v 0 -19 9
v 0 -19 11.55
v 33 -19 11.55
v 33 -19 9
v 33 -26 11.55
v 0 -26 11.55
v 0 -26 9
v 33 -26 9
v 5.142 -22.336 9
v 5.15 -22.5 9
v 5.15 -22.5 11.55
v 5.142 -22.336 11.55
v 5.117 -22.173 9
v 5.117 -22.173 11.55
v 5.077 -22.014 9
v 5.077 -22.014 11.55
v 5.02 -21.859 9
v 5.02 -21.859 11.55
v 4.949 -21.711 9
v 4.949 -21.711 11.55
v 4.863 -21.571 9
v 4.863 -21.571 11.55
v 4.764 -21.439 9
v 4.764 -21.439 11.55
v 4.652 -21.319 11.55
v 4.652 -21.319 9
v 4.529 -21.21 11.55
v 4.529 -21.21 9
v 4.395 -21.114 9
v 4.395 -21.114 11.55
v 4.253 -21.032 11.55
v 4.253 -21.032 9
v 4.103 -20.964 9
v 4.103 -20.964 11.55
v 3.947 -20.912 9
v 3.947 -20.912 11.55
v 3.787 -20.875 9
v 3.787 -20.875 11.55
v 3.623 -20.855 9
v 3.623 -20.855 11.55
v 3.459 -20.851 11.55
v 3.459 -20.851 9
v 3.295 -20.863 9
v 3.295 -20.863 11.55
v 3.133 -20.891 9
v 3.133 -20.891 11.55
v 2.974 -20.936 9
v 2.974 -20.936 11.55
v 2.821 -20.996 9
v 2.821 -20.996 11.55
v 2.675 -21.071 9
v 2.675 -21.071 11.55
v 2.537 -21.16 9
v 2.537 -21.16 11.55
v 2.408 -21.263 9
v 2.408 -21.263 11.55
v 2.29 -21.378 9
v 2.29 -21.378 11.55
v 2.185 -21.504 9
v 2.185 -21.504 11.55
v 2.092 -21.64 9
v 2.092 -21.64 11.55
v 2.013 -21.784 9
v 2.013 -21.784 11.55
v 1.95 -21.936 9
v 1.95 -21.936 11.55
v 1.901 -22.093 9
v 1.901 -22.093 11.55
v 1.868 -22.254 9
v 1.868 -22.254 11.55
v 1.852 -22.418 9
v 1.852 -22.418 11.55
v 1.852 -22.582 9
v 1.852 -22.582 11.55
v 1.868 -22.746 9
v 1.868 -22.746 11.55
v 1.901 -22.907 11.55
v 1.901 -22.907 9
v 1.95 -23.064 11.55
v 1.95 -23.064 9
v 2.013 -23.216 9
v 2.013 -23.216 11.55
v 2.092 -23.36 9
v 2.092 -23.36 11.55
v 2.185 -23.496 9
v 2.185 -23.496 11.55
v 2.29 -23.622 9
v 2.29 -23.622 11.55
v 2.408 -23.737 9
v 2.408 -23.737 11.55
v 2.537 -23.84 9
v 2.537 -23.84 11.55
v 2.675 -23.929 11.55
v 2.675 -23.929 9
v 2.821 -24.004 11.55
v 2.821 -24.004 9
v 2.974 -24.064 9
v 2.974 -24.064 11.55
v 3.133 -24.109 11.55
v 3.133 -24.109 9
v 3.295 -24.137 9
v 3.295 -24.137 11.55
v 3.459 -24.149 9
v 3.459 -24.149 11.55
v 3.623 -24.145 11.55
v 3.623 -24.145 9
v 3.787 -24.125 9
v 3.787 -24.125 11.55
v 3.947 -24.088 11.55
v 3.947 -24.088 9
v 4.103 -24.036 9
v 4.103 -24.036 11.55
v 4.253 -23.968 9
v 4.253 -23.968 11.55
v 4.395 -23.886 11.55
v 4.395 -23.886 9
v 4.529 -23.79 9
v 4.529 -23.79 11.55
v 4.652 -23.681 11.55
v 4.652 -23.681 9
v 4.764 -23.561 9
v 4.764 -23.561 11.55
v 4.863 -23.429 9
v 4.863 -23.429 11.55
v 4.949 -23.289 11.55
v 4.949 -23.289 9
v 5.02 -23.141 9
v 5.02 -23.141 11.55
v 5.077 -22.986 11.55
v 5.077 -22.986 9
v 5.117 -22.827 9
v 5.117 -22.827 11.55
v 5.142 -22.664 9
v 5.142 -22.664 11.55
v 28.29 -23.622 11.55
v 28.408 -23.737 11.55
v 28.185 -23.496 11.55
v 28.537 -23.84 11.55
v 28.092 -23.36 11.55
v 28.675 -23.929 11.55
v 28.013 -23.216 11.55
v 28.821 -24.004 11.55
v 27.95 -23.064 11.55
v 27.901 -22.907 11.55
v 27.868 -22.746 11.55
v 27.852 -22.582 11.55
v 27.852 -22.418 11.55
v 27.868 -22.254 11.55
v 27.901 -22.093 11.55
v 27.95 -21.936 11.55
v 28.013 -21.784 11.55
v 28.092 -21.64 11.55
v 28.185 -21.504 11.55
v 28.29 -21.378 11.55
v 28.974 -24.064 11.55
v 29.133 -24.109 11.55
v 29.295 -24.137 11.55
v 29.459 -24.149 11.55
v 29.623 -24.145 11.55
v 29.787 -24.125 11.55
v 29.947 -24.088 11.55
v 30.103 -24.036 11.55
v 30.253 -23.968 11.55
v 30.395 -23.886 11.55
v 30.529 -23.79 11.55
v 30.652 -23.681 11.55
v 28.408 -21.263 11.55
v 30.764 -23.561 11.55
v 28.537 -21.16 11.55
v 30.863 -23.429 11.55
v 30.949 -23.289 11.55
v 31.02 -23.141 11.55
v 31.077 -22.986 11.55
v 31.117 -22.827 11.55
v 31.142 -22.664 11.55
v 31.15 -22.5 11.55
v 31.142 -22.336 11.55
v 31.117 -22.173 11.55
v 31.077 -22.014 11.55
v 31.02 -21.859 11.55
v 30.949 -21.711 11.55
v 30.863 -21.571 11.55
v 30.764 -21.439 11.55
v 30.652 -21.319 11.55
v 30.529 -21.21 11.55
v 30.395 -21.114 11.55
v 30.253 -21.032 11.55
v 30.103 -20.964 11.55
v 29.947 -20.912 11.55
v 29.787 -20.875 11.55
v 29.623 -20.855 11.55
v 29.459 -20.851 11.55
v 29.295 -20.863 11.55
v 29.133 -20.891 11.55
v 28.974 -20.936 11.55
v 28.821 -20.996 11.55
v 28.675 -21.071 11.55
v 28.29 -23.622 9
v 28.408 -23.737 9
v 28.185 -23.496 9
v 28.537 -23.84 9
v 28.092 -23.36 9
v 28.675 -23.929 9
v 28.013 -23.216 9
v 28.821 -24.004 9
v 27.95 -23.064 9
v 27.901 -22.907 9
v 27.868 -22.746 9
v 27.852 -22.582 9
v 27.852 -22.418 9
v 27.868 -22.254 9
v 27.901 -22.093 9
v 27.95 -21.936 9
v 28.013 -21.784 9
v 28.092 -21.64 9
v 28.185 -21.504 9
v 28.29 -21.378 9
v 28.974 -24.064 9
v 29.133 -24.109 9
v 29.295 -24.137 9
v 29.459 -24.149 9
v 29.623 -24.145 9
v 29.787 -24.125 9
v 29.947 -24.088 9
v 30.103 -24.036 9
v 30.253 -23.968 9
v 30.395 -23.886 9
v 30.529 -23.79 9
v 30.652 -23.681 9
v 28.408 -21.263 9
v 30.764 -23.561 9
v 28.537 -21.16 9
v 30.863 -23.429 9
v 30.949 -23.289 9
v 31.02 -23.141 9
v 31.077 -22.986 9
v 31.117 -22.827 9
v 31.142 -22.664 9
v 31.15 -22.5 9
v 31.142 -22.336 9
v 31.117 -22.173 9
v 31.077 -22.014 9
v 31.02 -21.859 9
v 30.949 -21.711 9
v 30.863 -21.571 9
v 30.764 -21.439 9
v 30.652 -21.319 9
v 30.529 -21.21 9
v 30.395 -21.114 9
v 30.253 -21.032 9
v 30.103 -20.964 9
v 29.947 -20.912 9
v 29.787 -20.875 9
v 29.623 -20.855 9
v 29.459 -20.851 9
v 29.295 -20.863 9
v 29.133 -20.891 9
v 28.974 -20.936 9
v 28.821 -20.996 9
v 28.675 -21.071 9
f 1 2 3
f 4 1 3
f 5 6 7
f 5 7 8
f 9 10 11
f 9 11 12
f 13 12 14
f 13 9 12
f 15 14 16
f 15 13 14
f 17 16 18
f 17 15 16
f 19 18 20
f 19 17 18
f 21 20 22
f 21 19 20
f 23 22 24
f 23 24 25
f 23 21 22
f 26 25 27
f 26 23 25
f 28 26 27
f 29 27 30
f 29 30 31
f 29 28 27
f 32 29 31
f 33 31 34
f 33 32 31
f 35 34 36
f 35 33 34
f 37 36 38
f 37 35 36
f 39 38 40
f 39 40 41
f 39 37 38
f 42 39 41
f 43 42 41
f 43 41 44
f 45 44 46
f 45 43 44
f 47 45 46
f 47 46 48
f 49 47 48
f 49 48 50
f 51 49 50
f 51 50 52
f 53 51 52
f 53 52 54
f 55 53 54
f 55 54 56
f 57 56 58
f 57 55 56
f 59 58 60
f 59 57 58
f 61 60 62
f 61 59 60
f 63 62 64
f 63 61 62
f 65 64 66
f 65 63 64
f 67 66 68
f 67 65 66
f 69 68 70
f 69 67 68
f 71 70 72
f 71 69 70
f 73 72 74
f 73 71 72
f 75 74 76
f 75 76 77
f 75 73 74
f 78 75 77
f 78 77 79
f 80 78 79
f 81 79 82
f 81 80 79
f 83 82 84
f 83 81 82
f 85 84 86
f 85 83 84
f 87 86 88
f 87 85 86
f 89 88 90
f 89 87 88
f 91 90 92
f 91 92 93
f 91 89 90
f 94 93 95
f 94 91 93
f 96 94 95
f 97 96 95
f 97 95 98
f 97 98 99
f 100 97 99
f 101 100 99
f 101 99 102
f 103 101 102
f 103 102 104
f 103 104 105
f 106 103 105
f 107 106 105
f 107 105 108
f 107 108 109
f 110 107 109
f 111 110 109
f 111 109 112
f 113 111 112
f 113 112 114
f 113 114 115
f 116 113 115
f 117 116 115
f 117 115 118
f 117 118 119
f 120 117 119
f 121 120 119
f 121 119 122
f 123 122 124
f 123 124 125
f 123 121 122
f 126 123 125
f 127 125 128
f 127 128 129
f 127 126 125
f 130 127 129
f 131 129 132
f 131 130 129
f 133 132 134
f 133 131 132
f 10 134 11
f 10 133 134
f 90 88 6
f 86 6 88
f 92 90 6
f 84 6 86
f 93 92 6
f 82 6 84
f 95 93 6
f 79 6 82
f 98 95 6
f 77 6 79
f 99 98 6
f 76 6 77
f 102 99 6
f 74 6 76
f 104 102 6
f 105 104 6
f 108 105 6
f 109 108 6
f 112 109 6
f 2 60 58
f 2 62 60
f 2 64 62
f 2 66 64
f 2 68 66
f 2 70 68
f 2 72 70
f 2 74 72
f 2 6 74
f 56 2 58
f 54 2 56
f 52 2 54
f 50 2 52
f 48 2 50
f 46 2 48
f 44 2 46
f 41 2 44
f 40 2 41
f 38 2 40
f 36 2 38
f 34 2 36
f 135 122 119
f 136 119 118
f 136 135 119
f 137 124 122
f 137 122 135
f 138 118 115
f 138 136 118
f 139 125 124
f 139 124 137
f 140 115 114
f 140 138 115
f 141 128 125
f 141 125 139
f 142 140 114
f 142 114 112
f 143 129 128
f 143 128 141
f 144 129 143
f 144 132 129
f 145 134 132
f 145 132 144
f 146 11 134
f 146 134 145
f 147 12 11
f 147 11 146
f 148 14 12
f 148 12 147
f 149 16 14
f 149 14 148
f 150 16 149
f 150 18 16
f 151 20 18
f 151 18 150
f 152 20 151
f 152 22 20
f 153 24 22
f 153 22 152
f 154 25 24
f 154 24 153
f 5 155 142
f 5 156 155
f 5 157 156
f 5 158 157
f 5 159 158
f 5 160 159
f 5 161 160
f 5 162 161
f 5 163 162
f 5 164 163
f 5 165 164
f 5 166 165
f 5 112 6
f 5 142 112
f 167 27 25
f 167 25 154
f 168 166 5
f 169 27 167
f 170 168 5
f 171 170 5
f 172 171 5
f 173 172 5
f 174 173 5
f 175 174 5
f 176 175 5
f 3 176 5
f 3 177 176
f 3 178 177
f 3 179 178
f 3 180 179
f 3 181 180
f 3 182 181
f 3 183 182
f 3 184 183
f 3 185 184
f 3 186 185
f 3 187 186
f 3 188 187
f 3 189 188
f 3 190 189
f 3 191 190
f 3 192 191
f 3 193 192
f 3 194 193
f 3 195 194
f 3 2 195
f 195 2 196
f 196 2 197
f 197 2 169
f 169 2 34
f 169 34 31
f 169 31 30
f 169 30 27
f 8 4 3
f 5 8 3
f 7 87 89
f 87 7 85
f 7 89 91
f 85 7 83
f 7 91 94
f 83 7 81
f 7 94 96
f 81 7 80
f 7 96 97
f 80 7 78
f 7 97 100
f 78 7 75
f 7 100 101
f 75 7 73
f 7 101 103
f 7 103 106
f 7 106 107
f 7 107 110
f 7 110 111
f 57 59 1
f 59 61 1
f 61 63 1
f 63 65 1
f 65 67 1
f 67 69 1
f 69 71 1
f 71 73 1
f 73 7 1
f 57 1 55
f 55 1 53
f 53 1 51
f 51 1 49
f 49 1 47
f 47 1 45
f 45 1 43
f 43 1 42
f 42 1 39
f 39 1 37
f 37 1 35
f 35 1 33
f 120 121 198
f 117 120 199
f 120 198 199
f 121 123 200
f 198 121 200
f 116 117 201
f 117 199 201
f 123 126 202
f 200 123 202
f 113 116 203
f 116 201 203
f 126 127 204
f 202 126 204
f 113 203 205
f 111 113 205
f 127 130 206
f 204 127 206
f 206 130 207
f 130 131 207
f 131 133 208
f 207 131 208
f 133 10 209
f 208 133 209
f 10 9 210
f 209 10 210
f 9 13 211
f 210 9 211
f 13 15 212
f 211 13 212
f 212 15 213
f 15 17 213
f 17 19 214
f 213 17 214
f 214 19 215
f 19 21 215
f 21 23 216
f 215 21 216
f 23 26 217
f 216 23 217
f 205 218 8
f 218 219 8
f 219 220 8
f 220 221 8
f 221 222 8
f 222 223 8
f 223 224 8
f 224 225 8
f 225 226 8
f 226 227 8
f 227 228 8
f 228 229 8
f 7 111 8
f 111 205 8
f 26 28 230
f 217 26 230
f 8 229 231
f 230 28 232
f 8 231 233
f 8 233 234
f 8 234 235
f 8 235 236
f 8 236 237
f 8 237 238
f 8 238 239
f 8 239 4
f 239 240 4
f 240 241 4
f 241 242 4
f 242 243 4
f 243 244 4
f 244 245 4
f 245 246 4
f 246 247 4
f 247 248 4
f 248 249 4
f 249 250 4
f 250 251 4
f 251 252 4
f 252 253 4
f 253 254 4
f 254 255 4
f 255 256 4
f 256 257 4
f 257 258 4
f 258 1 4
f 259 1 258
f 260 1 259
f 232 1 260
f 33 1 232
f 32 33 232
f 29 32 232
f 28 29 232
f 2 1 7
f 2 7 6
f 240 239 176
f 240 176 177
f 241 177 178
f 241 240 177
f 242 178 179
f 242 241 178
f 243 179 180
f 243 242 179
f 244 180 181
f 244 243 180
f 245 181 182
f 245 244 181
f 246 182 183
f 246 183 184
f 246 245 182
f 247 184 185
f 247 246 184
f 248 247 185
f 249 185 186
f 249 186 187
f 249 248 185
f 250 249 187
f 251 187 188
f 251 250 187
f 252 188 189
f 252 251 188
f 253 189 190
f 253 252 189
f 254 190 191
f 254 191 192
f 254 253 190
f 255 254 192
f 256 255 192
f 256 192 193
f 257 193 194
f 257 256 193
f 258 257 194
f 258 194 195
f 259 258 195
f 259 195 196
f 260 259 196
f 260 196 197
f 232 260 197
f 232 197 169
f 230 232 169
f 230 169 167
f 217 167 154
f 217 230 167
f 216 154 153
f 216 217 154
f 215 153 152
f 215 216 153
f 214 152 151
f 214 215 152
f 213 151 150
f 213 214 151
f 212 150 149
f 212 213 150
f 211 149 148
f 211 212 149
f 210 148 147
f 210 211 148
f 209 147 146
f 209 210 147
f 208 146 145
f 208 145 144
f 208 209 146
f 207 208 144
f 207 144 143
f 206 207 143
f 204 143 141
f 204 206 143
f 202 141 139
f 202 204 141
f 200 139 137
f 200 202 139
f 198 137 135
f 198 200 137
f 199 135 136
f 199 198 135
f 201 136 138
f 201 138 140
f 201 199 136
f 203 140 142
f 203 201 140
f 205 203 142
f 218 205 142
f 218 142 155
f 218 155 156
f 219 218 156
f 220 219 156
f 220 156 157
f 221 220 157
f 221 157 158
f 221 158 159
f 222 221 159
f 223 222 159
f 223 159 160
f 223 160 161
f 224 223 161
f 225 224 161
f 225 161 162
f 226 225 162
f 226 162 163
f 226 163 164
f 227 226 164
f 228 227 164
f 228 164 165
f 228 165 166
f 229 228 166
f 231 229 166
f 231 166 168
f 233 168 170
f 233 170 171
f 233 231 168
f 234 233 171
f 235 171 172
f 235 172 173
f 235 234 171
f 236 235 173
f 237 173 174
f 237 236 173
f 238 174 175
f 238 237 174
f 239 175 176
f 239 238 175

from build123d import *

# Parameters (mm, degrees)
CYLINDER003_R     = 1.65
CYLINDER003_DEPTH = 2.55
BOX004_W          = 33
BOX004_H          = 2.55
BOX004_DEPTH      = 7


with BuildPart() as hole001:
    # Cylinder003 → Cylinder003 (new body)
    with BuildSketch(Plane(origin=(3.5, -22.5, 9), x_dir=(1, 0, 0), z_dir=(0, 0, 1))):
        Circle(CYLINDER003_R)
    extrude(amount=CYLINDER003_DEPTH)


with BuildPart() as hole005:
    # Clone012 base: copy of hole001
    add(hole001.part)


with BuildPart() as hole005_1:
    # Clone012 placement: moved
    add(hole005.part.moved(Location((26, 0, 0))))


with BuildPart() as fusion002:
    # Fusion002 base: copy of hole001
    add(hole001.part)

    # Fusion002: union hole005
    add(hole005_1.part)


with BuildPart() as micbar001:
    # Box004 → Box004 (new body)
    with BuildSketch(Plane(origin=(0, -19, 9), x_dir=(1, 0, 0), z_dir=(0, -1, 0))):
        with Locations((16.5, 1.275)):
            Rectangle(BOX004_W, BOX004_H)
    extrude(amount=BOX004_DEPTH)

    # Cut002: cut Fusion002
    add(fusion002.part, mode=Mode.SUBTRACT)


solid = micbar001.part
